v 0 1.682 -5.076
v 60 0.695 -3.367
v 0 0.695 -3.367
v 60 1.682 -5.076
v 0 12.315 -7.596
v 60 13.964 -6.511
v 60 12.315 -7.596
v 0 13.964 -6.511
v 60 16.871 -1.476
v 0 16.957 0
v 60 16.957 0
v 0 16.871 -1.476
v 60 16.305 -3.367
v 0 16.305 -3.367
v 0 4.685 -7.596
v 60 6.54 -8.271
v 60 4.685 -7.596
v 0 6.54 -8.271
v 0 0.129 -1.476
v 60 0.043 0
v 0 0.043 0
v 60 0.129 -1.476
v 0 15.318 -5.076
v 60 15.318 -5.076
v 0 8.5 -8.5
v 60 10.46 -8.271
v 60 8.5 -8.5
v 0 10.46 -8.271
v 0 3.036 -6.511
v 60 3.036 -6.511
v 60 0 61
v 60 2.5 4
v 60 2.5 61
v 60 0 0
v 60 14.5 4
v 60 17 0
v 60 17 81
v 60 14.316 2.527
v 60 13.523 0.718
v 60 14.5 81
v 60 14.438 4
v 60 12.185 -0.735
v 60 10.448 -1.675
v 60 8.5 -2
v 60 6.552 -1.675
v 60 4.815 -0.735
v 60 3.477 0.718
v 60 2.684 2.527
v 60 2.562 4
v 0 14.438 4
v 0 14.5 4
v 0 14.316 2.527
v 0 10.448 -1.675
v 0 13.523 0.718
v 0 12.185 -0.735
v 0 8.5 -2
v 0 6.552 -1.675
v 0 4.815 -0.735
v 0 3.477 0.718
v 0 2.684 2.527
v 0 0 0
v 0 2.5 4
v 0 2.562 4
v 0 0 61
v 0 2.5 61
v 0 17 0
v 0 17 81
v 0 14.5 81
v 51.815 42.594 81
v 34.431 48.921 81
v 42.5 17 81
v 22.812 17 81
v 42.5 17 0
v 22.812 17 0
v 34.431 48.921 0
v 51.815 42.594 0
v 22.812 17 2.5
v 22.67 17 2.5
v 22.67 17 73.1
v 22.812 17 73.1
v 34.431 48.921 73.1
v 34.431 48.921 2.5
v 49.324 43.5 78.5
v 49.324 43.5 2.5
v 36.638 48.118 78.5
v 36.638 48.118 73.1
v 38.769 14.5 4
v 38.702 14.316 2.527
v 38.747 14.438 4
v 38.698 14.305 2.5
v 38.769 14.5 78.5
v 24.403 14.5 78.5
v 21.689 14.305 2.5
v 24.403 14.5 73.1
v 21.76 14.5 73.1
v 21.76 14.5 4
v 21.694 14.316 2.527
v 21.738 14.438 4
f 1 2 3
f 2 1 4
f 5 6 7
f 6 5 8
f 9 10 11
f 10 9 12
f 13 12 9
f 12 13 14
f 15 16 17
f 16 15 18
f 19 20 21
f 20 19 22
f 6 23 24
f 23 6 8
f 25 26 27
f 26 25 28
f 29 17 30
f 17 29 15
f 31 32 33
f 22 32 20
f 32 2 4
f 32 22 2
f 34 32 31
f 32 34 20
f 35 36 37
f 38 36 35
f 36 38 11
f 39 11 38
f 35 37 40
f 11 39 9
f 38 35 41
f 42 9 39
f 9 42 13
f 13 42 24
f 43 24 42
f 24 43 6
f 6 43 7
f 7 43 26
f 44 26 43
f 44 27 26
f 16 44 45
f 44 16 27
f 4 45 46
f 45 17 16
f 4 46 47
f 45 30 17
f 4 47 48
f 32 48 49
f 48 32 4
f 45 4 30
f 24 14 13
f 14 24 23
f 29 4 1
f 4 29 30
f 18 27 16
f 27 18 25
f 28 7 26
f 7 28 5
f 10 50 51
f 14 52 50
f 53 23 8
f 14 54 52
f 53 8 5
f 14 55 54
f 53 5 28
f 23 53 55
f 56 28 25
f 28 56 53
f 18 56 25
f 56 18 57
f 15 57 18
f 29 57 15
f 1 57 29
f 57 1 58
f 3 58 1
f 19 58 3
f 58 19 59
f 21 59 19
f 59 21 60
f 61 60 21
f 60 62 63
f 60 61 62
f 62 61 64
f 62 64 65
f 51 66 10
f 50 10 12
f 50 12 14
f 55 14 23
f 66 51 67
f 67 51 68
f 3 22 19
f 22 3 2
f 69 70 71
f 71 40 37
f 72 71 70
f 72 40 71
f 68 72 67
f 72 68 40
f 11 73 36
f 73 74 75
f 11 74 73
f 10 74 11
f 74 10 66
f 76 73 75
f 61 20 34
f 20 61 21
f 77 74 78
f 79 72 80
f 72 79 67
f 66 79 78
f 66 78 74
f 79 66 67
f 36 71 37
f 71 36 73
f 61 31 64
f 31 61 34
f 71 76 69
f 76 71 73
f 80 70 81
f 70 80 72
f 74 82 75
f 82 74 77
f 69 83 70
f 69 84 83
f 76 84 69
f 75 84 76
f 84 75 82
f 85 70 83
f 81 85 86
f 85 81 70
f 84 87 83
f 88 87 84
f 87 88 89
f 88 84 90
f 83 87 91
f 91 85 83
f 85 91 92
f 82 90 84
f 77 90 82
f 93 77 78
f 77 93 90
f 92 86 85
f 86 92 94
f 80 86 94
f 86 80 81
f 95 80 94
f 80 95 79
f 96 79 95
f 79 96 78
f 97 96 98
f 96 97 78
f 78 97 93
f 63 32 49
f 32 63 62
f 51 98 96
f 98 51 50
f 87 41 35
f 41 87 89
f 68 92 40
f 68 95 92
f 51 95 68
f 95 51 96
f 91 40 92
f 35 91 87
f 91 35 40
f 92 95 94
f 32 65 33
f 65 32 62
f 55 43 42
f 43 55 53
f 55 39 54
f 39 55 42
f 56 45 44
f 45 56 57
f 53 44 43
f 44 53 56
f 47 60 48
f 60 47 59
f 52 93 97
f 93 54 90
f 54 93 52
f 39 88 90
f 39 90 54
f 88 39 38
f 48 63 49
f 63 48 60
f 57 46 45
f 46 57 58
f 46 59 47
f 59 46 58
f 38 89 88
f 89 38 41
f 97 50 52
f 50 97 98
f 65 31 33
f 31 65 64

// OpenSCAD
/*
 * A bracket to mount a phone mount in the van on
 */

slot_height = 76;
slot_width = 13.5;

wall_thickness = 2.5;
bracket_width = 60;
bracket_height = slot_height + (2 * wall_thickness);
bracket_thickness = 17;
bracket_leg_width = 10;
bracket_top_height = 4;
bracket_back_leg_shorten = 20;
bracket_back_height = bracket_height - bracket_back_leg_shorten;

cutout_width = bracket_width + 1; 
cutout_height = bracket_height - bracket_top_height;
cutout_thickness = bracket_thickness - 2  * wall_thickness;
cutout_cylinder_diameter = bracket_thickness - 2 * wall_thickness;
cutout_y_offset = (bracket_thickness - cutout_thickness)/2;

slot_depth = 40;

module phone_box_cutout()
{
   lip_height = bracket_height / 15;
   translate([(bracket_width-slot_width)/2-wall_thickness, bracket_thickness/1.45, wall_thickness])
     rotate([0, 0, -20])
        cube([wall_thickness, slot_depth, slot_height-lip_height]);
}

module phone_box()
{
   translate([(bracket_width-slot_width)/2-wall_thickness, bracket_thickness/1.5, 0])
     rotate([0, 0, -20])
        cube([slot_width+2*wall_thickness, slot_depth, slot_height+2*wall_thickness]);
}

module phone_slot()
{
   translate([(bracket_width-slot_width)/2, bracket_thickness/1.5, wall_thickness])
     rotate([0, 0, -20])
        cube([slot_width, slot_depth+10, slot_height]);
}

module cube_with_rounded_top()
{
   union()
   {
      rotate ([0, 90, 0])
         translate([0, bracket_thickness/2, 0]) 
            cylinder (h=bracket_width, d=bracket_thickness);
      cube([bracket_width, bracket_thickness, bracket_height]);
      phone_box();
   }
}

difference() 
{
   difference()
   {
      cube_with_rounded_top();
      phone_slot();
      phone_box_cutout();
   }
      
   union() /* cutout with rounded top */
      translate([0, cutout_y_offset, bracket_top_height]) 
         cube([cutout_width, cutout_thickness, cutout_height]);
      translate([0, bracket_thickness/2, bracket_top_height])
         rotate ([0, 90, 0]) 
            cylinder (h=bracket_width, d=cutout_cylinder_diameter);

   /* shorten back */
   translate([0, 0, bracket_height - bracket_back_leg_shorten])
      cube([bracket_width, wall_thickness, bracket_back_leg_shorten]);

}
